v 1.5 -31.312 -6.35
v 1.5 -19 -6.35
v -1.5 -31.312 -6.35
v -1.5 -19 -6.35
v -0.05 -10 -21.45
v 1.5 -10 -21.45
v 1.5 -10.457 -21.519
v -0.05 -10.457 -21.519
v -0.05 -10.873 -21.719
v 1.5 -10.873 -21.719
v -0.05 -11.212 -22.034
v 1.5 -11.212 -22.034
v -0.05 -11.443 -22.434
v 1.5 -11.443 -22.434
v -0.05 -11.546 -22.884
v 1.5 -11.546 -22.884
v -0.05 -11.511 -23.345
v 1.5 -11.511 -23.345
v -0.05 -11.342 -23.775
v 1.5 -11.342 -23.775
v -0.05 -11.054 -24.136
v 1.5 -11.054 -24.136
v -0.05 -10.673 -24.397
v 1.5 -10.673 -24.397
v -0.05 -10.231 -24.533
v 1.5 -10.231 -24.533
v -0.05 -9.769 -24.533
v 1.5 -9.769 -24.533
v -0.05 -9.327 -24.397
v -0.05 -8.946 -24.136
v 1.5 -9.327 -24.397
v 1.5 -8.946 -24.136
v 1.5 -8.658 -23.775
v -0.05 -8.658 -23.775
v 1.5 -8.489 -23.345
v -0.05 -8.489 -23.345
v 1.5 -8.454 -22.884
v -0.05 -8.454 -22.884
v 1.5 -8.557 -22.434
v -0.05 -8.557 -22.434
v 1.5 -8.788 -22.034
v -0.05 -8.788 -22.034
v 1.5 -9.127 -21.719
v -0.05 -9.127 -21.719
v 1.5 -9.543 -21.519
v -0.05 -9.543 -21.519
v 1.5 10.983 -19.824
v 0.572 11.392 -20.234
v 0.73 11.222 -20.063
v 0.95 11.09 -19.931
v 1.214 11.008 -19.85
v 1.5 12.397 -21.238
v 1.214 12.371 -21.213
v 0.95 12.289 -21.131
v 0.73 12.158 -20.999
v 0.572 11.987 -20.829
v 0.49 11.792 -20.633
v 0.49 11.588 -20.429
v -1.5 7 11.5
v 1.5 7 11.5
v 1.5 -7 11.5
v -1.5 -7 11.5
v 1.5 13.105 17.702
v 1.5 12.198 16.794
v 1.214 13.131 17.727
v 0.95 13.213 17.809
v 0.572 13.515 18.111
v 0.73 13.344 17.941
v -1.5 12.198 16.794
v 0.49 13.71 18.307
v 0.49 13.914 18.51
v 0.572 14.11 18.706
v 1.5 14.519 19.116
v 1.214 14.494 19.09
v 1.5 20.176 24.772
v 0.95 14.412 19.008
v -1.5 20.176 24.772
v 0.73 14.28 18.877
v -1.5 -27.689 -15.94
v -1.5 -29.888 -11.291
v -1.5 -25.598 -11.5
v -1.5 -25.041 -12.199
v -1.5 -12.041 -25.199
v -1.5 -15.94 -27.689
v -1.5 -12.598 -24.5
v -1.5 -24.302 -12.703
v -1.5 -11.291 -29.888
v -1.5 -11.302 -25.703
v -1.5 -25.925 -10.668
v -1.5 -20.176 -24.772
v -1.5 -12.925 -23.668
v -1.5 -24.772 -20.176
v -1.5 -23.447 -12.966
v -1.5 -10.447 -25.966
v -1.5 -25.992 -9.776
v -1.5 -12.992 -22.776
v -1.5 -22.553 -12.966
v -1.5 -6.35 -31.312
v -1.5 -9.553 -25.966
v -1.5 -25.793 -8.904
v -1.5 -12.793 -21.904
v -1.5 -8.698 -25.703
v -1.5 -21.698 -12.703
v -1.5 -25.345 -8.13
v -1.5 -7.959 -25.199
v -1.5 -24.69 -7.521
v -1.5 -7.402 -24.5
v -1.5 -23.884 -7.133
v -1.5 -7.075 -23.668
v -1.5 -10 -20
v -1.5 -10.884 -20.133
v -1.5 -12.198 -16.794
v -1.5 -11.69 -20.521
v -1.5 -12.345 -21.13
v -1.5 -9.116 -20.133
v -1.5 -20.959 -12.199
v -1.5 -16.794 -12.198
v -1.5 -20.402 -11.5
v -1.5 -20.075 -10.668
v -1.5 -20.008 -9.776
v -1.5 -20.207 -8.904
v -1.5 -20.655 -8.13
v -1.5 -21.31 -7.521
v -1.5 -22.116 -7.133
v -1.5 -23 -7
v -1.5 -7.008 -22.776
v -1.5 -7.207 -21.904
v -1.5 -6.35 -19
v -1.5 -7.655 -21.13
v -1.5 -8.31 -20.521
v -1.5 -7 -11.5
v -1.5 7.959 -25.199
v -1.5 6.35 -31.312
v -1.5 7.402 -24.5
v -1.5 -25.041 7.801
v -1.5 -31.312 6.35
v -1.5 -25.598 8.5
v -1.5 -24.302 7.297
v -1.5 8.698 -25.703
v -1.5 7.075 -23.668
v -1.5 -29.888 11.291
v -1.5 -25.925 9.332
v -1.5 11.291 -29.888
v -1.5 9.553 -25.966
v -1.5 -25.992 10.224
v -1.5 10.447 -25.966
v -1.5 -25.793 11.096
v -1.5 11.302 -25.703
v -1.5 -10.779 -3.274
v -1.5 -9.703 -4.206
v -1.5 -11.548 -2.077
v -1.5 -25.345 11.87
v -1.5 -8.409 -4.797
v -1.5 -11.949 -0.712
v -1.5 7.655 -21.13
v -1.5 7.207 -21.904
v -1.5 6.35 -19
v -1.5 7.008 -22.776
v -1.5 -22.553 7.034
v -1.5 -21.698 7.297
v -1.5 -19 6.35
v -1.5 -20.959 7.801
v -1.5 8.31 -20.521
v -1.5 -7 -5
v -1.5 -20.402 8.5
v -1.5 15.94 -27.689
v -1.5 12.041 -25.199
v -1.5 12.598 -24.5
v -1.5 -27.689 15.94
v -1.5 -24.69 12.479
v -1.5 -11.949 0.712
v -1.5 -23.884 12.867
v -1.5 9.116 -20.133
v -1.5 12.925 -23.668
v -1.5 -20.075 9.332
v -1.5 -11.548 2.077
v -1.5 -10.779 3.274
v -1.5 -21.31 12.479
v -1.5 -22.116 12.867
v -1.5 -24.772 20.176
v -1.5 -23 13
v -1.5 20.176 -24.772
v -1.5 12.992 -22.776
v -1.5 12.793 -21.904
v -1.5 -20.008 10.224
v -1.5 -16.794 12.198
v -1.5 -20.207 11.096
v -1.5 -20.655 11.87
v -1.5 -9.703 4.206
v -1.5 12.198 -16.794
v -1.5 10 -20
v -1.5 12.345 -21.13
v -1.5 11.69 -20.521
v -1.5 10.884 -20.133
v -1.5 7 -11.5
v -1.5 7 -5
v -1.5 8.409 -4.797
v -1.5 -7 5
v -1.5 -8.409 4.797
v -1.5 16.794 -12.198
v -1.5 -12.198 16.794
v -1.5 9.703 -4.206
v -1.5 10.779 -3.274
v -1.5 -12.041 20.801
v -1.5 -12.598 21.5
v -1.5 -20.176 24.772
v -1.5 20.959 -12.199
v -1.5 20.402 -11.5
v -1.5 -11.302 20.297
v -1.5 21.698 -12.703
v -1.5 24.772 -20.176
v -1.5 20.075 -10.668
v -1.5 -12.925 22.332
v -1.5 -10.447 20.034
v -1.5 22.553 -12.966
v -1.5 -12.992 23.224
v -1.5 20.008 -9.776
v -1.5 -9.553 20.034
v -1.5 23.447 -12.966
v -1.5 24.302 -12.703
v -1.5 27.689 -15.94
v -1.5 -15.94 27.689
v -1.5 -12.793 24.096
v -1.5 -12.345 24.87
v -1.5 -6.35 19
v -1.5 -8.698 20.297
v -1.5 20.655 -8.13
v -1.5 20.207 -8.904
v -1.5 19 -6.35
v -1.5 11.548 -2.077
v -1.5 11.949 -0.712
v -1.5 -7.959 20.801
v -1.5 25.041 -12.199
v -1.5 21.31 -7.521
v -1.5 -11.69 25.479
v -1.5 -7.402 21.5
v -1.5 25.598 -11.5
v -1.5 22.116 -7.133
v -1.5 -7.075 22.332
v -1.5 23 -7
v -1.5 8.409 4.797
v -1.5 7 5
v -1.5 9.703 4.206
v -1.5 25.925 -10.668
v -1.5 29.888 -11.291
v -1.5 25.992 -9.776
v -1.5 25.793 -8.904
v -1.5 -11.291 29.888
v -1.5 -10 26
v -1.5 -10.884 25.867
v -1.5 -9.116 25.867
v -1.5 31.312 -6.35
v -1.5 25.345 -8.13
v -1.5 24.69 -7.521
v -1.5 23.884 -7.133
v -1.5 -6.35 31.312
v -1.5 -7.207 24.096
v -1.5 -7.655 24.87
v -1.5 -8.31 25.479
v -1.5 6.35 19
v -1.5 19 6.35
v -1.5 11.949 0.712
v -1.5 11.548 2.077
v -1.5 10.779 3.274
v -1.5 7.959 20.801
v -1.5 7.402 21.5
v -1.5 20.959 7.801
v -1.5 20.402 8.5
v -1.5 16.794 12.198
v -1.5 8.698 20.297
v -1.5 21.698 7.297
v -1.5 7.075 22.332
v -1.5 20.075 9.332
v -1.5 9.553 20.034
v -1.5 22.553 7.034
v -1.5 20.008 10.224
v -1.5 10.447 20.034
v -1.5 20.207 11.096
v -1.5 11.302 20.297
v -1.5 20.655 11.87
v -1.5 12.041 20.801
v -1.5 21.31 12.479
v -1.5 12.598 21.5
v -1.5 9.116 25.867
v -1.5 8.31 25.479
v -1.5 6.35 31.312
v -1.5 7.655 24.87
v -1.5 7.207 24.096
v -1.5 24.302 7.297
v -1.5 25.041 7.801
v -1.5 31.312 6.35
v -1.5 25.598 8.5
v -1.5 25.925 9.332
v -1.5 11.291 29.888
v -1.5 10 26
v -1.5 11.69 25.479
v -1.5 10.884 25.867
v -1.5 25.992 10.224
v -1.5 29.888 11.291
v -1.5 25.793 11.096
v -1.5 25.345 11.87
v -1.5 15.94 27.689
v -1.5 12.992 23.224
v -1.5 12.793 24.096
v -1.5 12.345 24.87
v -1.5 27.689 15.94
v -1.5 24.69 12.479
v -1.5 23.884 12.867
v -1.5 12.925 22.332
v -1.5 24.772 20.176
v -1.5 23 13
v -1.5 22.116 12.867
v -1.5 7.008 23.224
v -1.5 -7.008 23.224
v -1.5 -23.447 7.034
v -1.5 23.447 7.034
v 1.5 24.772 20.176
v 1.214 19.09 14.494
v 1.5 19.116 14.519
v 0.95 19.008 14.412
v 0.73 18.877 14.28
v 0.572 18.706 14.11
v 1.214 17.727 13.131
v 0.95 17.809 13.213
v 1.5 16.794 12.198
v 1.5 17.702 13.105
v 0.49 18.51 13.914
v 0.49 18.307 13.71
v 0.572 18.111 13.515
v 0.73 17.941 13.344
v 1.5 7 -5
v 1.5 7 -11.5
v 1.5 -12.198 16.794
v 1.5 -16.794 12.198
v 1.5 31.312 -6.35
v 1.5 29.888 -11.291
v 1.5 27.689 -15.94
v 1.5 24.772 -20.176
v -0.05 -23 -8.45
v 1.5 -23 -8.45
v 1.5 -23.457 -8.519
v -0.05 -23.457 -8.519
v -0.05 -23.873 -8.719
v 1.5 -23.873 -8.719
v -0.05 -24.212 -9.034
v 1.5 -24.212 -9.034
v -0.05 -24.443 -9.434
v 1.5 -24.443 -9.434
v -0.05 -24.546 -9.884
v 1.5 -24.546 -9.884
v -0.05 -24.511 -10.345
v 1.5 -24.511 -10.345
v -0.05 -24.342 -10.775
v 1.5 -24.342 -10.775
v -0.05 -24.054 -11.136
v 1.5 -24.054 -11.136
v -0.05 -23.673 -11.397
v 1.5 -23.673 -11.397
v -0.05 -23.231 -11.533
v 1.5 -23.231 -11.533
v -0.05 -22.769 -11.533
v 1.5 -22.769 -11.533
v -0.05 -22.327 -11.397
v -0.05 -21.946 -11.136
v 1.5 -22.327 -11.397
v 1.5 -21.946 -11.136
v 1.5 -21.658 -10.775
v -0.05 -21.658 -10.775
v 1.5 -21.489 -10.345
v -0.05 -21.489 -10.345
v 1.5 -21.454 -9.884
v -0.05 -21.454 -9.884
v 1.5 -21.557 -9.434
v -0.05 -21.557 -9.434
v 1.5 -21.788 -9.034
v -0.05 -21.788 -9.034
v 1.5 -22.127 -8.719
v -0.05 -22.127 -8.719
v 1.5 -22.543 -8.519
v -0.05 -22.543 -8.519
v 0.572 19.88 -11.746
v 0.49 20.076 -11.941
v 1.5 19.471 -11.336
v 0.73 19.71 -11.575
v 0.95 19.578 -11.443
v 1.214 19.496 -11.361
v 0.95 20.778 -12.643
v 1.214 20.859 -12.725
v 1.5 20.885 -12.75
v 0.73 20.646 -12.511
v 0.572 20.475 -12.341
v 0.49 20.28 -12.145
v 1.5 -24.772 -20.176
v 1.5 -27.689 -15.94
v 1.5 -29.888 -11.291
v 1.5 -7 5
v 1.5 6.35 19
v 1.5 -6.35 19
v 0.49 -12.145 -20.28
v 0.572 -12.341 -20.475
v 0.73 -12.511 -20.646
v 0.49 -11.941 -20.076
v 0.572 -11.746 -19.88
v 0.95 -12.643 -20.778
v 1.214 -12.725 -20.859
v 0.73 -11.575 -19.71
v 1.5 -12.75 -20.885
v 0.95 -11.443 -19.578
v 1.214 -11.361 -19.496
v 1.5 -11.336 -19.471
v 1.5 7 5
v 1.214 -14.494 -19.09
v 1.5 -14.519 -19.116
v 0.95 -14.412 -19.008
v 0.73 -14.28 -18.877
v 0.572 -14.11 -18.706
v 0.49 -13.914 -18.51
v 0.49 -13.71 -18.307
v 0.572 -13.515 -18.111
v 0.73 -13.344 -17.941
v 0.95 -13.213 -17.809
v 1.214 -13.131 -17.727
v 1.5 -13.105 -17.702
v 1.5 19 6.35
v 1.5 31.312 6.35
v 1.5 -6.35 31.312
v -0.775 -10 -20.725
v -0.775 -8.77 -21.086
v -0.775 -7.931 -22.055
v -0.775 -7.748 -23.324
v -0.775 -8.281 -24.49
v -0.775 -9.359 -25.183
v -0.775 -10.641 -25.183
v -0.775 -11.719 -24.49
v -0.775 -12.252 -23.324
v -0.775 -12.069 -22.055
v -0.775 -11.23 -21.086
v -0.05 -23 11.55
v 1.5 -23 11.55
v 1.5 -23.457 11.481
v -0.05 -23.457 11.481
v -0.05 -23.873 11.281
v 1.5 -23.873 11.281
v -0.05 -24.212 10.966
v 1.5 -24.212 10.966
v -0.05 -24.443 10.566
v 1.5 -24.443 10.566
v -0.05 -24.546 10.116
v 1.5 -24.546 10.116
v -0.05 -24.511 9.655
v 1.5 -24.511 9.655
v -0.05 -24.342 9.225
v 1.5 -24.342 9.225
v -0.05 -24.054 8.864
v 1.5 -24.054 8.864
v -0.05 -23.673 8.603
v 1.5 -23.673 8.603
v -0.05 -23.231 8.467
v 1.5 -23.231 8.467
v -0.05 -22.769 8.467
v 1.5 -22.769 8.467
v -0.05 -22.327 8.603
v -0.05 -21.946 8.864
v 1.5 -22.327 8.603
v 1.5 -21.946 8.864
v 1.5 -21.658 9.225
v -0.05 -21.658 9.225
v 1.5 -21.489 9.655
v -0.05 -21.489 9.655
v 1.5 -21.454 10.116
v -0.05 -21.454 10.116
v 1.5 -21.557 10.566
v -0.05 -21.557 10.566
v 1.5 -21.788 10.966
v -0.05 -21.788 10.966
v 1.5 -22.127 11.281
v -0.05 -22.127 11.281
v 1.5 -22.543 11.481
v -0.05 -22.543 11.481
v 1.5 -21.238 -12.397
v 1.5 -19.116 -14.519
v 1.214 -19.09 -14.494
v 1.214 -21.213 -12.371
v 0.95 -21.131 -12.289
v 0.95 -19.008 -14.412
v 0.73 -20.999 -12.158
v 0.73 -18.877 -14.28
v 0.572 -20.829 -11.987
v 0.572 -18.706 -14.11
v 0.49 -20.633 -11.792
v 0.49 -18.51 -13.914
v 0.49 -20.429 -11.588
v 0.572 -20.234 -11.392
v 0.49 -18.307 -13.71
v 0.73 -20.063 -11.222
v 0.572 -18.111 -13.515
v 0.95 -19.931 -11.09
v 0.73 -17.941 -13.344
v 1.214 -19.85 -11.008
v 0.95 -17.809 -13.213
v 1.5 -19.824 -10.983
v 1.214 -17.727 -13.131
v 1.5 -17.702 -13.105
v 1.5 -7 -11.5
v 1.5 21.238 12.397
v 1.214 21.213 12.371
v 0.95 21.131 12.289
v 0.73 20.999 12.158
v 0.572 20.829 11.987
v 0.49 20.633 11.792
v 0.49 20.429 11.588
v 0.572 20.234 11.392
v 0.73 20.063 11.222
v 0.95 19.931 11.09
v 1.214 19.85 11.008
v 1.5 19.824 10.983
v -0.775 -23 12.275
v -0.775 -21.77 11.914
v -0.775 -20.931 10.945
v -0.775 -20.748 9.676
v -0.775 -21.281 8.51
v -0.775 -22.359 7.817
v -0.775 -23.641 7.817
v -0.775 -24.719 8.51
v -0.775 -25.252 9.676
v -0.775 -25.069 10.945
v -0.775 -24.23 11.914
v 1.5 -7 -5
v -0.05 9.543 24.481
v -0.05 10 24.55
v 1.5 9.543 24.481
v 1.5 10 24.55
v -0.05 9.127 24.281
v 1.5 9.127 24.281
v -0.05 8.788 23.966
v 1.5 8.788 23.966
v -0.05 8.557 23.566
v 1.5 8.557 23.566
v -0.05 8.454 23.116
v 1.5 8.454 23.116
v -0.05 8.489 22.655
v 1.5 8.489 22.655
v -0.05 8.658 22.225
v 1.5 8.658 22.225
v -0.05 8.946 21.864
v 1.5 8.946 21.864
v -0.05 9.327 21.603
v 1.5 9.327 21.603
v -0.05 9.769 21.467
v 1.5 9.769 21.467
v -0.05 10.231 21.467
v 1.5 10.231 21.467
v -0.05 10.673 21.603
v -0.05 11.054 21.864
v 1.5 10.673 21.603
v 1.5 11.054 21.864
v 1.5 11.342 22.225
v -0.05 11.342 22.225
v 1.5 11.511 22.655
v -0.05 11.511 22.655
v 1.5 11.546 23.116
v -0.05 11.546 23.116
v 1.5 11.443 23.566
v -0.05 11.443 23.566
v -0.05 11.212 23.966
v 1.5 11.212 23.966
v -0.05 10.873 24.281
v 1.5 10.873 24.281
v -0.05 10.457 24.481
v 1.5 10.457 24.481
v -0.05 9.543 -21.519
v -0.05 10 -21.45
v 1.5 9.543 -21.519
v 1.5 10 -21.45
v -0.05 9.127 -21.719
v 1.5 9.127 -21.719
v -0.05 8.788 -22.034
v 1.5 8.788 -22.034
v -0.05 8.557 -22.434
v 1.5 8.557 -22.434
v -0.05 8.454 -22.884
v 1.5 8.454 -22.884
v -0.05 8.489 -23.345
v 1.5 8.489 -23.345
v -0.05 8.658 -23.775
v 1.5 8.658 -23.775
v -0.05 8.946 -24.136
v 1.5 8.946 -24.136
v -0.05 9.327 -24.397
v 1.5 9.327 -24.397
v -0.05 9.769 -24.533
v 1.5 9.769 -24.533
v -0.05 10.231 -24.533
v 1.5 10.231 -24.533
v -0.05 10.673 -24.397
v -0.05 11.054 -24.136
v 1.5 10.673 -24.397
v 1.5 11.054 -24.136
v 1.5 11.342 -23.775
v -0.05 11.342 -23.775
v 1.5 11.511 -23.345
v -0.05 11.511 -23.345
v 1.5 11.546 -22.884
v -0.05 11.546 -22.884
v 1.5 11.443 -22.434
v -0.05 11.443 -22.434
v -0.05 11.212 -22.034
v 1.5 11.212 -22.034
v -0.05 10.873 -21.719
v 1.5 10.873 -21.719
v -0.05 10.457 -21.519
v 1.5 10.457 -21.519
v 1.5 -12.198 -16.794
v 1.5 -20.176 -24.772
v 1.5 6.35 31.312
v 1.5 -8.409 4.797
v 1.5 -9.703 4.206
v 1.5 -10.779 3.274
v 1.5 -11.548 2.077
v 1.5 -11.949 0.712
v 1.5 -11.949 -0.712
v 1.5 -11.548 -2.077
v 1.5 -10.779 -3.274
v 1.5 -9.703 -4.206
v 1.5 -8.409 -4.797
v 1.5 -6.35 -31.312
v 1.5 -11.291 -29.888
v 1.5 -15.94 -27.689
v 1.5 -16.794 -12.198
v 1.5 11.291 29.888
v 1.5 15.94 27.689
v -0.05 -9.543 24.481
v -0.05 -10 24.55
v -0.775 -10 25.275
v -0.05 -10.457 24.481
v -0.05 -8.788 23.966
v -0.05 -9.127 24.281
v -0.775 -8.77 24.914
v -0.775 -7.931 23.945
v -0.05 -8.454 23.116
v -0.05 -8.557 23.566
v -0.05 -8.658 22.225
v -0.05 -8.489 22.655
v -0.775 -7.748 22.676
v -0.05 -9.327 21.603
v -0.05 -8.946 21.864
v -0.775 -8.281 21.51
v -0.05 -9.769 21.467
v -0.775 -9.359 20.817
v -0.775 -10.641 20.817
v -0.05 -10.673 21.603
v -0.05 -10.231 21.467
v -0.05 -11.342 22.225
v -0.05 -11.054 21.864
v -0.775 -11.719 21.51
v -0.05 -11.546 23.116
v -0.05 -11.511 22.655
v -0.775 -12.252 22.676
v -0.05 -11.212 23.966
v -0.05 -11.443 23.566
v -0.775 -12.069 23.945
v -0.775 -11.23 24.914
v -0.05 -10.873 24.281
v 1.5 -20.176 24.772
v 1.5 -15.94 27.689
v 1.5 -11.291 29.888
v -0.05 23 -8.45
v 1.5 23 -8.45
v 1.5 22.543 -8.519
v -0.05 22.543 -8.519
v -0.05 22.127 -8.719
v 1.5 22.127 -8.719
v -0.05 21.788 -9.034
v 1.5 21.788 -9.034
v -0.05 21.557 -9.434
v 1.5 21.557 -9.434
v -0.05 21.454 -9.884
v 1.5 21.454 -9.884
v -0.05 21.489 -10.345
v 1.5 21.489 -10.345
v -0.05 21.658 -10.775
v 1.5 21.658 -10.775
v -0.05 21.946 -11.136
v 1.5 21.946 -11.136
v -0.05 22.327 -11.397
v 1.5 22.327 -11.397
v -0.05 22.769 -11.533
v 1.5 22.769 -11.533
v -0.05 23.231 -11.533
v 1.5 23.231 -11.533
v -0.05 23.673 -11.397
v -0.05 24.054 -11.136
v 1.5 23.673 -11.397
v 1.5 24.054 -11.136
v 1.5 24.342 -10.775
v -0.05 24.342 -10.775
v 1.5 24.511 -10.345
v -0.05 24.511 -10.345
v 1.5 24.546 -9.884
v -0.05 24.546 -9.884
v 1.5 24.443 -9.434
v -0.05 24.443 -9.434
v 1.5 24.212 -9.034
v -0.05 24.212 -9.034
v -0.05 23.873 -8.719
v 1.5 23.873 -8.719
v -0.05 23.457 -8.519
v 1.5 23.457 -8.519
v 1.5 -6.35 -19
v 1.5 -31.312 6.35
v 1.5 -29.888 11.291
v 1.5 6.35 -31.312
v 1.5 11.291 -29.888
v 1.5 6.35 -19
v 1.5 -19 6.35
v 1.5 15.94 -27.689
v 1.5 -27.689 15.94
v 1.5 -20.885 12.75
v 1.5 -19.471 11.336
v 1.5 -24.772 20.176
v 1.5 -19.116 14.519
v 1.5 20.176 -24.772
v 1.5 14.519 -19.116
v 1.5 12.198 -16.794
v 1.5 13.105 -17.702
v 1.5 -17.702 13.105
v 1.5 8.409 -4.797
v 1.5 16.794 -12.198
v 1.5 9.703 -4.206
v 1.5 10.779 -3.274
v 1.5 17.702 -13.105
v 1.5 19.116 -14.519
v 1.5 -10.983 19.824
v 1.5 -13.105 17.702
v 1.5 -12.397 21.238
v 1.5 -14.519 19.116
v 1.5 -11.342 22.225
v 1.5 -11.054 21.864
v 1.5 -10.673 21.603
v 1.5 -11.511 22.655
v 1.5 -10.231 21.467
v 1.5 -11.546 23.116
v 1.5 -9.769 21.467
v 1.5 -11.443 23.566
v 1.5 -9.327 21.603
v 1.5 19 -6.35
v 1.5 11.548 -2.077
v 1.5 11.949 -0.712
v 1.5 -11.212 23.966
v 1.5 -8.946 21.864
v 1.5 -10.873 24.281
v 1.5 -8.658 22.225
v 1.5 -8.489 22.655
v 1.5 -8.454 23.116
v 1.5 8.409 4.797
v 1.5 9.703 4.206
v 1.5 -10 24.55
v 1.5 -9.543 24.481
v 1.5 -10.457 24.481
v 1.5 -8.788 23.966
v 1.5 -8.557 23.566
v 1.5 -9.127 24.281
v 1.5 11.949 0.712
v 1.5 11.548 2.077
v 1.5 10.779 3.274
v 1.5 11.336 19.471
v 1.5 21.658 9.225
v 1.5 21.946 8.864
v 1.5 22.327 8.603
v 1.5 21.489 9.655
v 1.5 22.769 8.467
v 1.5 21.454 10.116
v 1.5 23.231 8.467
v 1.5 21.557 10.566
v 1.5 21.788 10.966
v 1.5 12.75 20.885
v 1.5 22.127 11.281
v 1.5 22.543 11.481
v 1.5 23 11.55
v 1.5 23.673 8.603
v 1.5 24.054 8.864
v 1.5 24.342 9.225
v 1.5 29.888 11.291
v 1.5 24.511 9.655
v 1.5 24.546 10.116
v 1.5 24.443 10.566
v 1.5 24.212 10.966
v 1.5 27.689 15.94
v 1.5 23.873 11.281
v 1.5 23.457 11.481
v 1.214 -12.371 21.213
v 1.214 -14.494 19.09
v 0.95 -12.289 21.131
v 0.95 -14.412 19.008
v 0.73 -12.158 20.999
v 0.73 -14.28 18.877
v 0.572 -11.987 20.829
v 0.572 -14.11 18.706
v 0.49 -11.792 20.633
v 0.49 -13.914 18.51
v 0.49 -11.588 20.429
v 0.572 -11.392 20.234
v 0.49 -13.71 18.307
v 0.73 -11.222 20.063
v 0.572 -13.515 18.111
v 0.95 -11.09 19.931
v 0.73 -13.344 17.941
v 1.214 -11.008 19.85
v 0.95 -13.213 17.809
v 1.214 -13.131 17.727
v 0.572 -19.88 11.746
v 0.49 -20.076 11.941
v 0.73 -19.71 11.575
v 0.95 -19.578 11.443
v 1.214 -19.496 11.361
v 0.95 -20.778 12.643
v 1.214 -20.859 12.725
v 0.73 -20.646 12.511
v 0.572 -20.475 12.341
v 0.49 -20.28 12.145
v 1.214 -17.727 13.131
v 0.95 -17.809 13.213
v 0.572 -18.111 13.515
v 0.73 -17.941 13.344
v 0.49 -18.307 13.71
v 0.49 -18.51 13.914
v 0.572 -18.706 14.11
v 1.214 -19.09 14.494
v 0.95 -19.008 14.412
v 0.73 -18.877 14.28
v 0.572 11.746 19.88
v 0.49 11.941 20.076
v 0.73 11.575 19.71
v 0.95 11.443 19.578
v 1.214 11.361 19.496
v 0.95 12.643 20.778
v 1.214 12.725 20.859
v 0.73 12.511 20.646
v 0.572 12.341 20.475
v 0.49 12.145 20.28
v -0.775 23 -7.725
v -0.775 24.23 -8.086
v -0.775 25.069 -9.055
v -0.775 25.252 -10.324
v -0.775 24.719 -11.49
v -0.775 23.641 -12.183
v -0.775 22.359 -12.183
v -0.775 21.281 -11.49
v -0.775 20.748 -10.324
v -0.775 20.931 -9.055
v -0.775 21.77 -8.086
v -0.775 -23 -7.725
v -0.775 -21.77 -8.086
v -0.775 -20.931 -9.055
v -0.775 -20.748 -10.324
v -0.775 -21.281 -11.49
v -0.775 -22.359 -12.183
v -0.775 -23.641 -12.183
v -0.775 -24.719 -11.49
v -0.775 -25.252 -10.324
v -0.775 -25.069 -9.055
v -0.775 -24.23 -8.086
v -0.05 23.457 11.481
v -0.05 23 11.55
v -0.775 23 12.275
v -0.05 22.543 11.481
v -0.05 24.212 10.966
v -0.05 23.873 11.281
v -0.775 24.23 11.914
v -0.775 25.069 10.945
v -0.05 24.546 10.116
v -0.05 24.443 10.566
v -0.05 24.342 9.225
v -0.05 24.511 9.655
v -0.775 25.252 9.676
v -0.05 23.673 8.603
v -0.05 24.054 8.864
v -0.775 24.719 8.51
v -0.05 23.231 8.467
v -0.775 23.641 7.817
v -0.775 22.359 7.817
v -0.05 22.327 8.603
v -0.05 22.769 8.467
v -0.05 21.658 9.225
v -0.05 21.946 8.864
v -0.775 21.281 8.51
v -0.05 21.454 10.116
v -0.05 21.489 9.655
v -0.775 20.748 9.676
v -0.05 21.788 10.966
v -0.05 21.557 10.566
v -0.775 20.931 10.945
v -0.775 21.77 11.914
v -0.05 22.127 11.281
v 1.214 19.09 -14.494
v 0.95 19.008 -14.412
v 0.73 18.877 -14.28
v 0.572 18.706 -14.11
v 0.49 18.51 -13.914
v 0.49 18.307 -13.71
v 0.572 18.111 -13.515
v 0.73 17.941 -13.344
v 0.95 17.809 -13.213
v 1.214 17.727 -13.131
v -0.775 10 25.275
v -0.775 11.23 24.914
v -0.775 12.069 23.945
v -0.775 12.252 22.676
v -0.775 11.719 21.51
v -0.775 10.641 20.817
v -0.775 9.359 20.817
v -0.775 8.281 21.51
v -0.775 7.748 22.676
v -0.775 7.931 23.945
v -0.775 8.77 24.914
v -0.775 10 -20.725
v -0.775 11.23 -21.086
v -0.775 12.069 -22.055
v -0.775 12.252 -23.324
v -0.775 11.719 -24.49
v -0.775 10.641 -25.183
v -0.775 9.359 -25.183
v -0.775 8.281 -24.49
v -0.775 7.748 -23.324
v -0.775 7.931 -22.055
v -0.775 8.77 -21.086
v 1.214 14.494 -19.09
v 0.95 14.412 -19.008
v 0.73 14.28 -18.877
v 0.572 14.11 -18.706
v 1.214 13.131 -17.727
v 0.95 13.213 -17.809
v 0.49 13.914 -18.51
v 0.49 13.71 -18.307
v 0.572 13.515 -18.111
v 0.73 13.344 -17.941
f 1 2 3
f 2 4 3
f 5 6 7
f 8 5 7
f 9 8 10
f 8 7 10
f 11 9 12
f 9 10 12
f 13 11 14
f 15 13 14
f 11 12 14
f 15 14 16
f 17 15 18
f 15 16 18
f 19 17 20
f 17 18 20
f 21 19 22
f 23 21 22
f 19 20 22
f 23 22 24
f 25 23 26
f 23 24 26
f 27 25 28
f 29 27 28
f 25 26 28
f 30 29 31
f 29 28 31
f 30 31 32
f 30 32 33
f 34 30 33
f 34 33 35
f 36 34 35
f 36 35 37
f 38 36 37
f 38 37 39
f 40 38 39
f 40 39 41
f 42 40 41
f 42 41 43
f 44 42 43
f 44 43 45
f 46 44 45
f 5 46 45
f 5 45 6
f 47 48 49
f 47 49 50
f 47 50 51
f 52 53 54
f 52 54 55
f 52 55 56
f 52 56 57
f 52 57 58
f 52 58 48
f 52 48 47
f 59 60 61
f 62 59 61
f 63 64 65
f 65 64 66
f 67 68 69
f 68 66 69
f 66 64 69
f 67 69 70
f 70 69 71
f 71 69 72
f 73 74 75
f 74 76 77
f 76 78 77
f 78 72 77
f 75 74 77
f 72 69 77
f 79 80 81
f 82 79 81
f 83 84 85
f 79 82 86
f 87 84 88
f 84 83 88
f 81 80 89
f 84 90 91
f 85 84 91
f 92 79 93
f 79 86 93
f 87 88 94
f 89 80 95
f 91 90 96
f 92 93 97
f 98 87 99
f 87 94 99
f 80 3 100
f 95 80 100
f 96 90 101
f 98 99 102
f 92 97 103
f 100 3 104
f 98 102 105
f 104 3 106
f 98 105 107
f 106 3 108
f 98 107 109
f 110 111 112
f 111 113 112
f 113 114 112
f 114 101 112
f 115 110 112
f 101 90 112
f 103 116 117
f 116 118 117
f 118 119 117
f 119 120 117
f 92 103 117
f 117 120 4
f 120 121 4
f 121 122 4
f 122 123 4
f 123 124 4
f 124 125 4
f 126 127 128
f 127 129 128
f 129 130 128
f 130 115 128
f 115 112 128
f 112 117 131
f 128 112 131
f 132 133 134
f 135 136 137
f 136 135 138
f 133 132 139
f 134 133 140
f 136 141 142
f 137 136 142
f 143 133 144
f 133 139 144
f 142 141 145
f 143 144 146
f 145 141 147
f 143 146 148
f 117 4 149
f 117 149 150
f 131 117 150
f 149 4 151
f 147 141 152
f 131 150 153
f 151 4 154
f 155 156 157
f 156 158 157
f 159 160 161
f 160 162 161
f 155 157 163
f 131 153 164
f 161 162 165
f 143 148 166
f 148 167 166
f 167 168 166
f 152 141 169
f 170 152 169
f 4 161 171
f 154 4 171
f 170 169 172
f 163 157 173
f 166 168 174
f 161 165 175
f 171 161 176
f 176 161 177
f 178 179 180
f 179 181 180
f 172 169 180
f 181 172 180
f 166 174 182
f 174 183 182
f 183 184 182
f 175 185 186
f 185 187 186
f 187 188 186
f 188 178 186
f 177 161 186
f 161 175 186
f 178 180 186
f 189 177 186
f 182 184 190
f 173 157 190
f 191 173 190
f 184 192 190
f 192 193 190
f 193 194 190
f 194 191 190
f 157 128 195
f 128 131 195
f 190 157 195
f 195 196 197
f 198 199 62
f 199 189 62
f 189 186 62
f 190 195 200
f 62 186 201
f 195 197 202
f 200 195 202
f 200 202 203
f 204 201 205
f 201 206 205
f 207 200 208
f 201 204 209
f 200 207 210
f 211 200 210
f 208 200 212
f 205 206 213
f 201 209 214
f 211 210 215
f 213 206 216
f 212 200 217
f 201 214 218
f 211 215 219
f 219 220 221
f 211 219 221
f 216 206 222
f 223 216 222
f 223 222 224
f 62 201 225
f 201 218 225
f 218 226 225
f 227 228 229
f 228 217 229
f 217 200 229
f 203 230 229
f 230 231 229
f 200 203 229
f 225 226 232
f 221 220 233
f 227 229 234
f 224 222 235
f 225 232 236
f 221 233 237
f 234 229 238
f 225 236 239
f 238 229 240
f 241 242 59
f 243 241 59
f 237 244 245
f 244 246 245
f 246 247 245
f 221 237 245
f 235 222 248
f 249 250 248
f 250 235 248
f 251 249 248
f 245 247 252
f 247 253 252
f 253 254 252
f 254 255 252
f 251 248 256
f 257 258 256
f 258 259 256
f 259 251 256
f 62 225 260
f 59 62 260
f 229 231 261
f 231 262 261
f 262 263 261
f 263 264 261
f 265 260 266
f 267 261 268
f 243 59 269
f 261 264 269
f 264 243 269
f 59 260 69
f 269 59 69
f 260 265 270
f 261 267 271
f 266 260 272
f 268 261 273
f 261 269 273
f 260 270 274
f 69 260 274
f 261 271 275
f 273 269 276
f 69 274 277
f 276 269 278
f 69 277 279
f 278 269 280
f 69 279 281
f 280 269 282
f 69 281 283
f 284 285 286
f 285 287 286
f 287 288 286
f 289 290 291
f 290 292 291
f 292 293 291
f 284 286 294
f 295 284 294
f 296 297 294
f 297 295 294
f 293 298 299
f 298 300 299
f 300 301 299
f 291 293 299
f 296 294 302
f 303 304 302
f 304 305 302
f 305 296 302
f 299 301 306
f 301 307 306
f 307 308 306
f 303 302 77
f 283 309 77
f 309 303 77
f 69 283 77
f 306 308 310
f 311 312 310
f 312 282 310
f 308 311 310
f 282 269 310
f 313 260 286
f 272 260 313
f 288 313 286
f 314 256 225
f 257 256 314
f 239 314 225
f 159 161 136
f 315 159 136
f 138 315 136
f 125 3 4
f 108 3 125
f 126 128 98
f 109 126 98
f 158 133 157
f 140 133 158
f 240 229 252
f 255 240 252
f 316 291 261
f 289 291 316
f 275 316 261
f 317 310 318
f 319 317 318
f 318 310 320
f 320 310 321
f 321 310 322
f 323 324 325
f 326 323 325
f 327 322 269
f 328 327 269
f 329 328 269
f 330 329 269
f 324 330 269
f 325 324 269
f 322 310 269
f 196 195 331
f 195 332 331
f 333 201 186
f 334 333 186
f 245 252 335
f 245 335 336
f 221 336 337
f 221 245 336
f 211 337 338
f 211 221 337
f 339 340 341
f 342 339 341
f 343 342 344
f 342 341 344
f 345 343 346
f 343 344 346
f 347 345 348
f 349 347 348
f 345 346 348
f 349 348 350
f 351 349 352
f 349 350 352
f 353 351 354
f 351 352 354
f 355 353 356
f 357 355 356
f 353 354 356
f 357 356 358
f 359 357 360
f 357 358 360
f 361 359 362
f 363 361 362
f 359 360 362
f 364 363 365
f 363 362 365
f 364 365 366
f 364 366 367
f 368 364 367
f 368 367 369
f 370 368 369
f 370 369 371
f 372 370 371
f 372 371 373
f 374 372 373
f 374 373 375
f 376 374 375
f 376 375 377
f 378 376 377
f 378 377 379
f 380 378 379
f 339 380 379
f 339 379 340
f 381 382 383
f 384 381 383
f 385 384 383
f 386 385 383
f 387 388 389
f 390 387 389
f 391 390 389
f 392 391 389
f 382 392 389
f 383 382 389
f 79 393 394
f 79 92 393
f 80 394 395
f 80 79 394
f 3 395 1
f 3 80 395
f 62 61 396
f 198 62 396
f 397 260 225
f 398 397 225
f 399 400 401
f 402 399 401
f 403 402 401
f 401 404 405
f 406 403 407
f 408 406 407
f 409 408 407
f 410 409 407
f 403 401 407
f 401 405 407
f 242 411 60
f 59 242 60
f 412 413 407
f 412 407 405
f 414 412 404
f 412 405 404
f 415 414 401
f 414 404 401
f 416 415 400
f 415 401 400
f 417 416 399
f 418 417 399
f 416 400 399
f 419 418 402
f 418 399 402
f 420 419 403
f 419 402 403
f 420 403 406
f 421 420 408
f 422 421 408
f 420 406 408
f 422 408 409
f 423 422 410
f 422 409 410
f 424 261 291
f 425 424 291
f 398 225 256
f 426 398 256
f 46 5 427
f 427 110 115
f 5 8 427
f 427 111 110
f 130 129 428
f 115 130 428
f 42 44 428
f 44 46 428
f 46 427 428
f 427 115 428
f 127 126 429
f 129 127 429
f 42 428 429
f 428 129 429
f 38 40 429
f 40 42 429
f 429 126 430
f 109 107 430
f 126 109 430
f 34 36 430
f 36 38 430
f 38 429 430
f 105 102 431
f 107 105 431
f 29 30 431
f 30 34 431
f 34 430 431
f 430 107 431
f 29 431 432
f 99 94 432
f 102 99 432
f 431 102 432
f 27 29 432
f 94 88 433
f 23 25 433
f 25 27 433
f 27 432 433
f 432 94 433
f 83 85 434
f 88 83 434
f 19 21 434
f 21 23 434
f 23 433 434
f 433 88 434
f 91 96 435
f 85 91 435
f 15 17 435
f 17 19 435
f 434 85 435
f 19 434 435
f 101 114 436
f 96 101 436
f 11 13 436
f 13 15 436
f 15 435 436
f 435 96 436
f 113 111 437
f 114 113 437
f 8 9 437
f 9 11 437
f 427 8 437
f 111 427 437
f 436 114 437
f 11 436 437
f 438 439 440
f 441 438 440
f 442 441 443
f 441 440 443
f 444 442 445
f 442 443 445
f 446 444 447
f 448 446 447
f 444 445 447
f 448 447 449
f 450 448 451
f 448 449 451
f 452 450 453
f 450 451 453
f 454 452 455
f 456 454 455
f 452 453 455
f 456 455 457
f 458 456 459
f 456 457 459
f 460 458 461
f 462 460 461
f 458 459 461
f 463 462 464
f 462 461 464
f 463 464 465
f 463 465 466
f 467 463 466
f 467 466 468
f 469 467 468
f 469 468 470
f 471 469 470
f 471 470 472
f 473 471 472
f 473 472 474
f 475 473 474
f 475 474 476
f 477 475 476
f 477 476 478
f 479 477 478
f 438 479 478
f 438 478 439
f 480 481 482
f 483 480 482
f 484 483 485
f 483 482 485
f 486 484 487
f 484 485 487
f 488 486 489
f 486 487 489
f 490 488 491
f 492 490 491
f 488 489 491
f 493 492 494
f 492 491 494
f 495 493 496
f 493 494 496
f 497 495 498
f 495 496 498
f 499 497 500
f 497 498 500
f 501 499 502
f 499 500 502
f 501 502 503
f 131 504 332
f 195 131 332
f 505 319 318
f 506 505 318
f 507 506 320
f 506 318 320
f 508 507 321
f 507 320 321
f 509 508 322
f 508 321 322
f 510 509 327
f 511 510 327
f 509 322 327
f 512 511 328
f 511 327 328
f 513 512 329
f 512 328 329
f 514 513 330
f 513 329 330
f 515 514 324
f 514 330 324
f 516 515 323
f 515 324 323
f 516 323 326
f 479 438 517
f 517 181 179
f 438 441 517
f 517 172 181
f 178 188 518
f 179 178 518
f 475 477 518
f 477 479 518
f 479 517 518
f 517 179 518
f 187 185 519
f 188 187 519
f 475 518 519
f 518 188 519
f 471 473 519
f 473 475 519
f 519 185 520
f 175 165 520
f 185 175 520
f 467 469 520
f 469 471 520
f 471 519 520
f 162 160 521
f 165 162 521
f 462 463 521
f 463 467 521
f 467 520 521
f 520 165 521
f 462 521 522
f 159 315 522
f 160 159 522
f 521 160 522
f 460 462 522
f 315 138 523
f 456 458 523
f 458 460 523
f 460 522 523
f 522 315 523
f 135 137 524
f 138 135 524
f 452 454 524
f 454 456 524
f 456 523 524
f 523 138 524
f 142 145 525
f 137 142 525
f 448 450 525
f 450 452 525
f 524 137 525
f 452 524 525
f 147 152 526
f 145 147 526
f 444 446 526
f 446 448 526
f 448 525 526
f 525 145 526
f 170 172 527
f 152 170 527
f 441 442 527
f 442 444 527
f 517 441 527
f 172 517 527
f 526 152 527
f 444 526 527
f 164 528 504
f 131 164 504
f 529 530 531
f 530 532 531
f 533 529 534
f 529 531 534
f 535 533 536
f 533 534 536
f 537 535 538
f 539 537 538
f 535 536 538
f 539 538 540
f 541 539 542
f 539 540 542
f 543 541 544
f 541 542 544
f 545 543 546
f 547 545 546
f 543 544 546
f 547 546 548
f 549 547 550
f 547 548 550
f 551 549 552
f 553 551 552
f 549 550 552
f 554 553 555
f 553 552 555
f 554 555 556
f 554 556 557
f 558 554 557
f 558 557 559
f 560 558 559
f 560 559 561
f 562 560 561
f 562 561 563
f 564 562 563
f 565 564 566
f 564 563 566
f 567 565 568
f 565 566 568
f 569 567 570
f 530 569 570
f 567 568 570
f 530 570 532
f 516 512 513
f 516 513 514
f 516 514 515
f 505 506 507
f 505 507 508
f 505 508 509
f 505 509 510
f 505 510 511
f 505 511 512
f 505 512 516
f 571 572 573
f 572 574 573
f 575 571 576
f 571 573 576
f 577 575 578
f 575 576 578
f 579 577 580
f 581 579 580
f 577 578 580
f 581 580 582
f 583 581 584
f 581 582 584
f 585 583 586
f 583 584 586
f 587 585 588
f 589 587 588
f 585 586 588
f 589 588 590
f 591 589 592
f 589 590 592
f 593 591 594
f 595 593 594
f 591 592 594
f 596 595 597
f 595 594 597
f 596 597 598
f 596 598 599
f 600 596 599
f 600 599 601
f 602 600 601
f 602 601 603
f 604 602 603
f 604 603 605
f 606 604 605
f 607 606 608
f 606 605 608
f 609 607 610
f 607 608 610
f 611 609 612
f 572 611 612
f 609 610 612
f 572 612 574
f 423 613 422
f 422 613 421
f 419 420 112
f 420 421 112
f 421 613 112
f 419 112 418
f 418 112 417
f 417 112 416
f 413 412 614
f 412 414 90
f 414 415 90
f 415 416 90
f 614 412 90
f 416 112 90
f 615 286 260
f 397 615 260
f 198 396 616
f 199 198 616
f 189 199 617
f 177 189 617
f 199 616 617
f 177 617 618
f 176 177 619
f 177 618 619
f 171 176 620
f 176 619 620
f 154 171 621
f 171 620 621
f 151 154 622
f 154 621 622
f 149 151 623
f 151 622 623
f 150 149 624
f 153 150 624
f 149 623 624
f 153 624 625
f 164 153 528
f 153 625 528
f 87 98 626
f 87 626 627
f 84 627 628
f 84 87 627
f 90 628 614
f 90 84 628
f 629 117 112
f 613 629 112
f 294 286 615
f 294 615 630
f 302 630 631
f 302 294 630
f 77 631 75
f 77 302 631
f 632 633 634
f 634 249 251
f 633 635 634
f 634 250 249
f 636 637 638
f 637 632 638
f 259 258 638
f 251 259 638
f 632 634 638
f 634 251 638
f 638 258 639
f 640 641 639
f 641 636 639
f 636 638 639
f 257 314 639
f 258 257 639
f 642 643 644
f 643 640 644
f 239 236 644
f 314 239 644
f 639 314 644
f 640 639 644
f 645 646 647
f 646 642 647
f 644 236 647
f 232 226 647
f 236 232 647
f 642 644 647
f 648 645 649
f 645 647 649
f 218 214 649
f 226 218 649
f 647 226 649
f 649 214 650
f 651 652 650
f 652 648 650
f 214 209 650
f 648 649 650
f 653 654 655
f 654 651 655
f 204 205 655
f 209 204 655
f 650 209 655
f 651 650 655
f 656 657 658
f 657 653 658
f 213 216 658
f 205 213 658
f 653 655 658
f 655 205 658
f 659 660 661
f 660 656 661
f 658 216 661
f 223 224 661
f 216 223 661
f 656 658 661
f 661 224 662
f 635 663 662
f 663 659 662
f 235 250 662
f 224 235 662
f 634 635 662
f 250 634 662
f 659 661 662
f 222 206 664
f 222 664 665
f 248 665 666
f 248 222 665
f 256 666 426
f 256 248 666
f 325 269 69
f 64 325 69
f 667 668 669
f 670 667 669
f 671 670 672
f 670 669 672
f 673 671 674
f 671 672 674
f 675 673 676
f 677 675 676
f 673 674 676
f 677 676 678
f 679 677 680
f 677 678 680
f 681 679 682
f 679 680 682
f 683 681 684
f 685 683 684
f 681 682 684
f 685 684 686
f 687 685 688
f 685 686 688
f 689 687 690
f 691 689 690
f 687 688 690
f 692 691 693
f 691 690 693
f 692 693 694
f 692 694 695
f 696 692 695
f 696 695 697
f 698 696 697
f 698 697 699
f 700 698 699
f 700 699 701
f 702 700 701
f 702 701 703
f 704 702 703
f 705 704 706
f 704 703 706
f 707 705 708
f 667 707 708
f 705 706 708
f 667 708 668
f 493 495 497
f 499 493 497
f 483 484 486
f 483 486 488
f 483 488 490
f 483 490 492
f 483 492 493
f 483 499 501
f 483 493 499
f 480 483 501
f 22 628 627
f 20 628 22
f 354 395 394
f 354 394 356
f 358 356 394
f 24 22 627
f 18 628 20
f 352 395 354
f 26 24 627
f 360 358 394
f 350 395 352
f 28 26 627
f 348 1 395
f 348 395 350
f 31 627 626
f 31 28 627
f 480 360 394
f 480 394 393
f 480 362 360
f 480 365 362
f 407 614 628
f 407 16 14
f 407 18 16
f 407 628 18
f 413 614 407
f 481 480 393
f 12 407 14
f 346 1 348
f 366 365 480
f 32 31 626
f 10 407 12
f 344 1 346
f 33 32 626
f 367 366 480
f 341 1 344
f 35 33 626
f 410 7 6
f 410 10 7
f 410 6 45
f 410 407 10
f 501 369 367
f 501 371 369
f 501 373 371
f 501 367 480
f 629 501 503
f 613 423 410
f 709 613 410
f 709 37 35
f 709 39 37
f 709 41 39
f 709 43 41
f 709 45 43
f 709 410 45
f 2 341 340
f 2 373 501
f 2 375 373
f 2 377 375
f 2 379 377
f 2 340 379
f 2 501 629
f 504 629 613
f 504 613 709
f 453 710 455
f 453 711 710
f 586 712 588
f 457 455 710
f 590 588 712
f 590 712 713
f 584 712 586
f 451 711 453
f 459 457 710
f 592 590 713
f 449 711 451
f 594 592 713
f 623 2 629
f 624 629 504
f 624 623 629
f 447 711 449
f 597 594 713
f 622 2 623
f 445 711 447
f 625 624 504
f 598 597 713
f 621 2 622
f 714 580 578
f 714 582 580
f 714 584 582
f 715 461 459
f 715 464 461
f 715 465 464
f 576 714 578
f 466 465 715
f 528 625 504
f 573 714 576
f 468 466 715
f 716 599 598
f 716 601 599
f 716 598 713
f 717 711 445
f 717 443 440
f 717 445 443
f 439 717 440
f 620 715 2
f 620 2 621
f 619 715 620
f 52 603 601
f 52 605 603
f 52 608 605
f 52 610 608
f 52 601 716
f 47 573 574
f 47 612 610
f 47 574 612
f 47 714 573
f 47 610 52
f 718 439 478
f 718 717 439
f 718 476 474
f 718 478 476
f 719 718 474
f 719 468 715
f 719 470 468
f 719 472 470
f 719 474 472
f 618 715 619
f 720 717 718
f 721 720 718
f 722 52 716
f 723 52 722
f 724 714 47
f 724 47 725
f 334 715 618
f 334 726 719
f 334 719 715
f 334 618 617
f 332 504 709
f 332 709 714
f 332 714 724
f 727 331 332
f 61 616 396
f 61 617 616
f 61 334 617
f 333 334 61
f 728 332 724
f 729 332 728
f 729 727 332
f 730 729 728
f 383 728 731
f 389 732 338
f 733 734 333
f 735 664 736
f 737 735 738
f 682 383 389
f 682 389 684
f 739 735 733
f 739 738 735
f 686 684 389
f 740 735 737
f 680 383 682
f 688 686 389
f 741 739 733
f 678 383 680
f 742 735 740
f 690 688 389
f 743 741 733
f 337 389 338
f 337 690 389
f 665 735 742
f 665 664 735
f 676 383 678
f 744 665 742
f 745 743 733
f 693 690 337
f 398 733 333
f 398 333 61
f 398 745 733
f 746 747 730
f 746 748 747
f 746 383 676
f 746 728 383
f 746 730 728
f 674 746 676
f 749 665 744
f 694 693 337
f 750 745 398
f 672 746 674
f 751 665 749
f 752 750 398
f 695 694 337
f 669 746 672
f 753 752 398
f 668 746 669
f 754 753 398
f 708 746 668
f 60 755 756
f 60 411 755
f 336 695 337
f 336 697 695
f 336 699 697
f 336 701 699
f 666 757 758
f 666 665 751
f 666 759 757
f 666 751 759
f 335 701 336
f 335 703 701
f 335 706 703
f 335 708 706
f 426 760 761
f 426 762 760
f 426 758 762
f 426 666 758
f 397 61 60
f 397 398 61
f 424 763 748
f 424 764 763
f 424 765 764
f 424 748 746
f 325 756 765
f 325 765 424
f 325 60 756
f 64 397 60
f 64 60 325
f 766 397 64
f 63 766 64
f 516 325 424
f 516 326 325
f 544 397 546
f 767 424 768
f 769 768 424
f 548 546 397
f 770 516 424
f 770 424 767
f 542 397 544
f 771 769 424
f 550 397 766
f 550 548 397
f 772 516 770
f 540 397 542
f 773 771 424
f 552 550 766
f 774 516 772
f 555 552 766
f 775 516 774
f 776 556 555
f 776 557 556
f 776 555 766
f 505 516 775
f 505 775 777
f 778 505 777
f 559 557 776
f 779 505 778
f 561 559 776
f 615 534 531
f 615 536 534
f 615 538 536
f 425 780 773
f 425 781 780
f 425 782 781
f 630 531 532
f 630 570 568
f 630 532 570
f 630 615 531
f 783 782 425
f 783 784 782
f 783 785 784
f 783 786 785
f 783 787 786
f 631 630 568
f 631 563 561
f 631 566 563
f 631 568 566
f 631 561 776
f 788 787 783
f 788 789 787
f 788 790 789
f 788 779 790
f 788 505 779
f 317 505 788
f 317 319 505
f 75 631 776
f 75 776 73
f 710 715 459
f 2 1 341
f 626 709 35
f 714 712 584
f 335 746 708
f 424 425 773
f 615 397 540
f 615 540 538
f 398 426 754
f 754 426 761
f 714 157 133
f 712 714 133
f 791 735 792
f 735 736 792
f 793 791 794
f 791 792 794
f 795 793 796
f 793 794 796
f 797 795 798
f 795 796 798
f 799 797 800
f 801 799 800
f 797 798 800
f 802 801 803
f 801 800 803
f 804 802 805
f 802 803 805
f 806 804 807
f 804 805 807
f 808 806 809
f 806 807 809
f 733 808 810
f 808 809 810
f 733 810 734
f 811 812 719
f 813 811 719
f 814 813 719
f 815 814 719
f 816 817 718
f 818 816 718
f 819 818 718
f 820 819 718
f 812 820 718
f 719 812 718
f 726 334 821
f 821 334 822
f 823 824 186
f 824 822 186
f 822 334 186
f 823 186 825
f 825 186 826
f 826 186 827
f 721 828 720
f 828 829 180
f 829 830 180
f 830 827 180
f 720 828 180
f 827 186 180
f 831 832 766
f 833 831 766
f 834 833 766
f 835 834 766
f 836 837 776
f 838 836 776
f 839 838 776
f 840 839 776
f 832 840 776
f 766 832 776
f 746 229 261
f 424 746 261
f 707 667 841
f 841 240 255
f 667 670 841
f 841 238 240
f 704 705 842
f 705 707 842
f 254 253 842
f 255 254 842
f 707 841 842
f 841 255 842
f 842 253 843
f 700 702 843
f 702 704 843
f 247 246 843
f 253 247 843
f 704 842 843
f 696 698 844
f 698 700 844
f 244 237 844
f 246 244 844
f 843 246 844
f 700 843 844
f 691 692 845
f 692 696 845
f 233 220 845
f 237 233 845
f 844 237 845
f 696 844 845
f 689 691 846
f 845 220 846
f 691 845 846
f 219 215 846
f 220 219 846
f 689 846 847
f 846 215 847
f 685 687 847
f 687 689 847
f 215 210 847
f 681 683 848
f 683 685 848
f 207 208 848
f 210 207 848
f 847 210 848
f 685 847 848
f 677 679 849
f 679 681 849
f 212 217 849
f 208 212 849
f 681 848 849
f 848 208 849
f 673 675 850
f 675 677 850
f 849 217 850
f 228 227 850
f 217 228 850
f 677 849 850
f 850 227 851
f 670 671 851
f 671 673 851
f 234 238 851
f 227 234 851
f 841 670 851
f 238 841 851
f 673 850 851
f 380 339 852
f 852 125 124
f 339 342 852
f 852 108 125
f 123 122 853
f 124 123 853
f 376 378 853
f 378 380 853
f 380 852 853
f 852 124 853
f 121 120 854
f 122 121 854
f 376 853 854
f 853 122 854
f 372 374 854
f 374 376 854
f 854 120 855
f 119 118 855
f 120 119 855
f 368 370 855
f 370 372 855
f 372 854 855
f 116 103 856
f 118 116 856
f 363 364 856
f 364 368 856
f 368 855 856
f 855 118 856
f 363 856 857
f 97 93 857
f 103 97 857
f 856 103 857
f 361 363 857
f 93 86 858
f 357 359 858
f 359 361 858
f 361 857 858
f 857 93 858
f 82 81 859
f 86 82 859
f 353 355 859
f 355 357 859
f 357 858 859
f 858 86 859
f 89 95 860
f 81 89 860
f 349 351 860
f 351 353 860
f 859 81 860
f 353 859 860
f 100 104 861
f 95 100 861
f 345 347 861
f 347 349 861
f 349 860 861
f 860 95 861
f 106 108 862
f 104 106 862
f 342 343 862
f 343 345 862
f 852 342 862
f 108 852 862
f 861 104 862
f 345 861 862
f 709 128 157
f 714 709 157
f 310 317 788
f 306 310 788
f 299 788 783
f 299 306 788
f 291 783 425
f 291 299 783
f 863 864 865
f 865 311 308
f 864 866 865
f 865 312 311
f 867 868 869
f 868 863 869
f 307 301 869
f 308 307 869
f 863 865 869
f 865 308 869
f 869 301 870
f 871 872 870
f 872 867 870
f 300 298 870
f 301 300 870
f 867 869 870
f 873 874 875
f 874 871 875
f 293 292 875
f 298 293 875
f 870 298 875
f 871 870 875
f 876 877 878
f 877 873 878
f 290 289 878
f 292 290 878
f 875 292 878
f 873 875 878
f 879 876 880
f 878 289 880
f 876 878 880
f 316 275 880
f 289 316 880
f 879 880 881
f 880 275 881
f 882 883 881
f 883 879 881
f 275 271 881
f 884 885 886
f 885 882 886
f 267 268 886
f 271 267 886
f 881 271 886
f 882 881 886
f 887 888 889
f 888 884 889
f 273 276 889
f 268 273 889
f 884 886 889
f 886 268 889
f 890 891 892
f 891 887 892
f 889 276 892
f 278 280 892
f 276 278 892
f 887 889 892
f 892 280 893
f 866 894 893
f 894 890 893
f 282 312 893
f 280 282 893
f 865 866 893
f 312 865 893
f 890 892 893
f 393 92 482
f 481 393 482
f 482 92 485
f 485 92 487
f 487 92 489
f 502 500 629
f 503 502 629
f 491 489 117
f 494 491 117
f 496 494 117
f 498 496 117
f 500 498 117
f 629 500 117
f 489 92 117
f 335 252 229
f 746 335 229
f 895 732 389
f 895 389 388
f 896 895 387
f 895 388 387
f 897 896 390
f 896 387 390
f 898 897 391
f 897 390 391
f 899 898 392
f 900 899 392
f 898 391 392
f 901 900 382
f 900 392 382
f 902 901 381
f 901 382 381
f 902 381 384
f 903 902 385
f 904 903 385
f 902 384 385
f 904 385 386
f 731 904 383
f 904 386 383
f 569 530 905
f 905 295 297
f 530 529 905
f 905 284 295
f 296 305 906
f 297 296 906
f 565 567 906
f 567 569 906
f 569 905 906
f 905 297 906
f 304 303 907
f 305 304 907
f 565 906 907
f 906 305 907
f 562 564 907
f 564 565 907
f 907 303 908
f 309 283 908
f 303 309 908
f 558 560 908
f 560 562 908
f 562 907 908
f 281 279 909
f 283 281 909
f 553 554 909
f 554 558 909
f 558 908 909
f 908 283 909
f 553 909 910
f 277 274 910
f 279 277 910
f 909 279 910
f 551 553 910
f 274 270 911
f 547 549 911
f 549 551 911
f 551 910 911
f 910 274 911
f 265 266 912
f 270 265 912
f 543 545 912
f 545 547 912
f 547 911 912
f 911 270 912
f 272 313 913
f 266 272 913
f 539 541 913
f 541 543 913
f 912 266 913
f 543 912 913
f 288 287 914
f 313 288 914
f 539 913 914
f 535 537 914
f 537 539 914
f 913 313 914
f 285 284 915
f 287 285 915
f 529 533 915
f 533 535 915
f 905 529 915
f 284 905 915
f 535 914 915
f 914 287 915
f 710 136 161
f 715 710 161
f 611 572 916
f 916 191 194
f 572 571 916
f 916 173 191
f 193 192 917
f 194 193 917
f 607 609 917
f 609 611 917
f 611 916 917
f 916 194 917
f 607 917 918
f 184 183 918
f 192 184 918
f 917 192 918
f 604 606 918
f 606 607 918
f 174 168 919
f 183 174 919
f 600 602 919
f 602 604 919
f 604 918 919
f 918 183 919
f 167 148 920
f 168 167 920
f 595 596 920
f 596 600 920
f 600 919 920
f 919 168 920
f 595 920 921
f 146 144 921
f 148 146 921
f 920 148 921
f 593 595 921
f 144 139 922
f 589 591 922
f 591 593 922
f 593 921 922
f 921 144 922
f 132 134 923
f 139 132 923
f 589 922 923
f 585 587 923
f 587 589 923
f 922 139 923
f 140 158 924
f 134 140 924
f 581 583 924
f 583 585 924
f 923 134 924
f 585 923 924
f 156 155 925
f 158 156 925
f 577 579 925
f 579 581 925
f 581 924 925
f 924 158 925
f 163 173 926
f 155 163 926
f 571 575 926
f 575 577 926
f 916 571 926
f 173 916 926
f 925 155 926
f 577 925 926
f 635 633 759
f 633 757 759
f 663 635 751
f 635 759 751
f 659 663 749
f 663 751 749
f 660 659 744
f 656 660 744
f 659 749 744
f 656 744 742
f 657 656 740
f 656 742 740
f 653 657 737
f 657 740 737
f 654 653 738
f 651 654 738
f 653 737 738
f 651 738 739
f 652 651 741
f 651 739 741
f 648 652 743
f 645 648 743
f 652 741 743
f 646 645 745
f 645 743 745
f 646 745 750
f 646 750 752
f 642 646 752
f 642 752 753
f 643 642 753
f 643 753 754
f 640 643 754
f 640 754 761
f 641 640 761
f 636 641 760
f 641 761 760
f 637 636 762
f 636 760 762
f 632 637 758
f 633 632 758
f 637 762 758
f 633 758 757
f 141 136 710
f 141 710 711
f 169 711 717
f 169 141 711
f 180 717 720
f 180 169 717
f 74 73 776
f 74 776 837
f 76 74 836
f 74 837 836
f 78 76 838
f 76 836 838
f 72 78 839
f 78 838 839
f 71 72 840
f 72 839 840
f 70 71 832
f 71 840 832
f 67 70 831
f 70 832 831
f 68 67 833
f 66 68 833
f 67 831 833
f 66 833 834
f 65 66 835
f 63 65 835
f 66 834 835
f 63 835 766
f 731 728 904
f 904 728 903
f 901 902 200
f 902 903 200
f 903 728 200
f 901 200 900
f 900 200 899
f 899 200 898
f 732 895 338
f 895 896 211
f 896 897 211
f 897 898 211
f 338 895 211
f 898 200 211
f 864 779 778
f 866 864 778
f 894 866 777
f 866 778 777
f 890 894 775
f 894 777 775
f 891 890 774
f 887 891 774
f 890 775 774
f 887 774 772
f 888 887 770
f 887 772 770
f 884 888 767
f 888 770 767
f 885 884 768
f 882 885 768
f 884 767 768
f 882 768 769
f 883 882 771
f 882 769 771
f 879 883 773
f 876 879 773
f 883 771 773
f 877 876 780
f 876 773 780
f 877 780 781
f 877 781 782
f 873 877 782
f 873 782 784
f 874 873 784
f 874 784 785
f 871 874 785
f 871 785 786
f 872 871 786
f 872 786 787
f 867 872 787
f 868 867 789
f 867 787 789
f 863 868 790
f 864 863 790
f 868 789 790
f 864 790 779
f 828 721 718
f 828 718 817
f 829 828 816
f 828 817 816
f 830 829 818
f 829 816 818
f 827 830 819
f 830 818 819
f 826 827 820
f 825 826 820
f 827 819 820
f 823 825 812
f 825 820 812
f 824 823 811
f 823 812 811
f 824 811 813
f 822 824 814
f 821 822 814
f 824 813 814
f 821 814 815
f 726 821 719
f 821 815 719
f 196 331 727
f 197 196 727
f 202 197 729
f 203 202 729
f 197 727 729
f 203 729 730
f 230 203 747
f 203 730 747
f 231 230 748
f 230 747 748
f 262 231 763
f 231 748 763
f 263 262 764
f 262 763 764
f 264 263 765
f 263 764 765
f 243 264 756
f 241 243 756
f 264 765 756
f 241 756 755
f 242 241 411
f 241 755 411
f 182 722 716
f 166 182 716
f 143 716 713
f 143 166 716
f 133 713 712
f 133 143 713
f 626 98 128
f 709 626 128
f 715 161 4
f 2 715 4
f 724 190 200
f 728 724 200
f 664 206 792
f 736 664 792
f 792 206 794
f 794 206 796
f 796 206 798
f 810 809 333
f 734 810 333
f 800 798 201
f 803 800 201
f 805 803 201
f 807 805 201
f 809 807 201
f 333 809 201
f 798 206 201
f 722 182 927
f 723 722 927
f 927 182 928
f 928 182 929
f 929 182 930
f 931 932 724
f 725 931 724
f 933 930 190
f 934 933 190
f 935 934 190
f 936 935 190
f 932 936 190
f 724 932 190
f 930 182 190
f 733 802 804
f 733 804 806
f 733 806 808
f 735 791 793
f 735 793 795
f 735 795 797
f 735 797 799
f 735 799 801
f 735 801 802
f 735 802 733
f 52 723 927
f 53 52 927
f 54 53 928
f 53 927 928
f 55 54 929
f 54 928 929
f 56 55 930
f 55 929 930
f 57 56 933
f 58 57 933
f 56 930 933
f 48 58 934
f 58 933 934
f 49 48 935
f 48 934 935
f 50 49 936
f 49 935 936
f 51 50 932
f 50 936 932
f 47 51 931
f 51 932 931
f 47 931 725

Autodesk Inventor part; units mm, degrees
ref_plane "YZ Plane" through (0, 0, 0) normal (1, 0, 0) x (0, 1, 0)
sketch "Náčrt1" plane through (0, 0, 0) normal (1, 0, 0) x (0, 1, 0)
  line L0 (19, 6.35) -> (31.312, 6.35)
  line L1 (31.312, -6.35) -> (19, -6.35)
  line L2 (19, -6.35) -> (19, 6.35)
  line L3 (24.7725, 20.1763) -> (16.7938, 12.1976)
  line L4 (16.7938, 12.1976) -> (12.1976, 16.7938)
  line L5 (12.1976, 16.7938) -> (20.1763, 24.7725)
  line L6 (0, 0) -> (14.4957, 14.4957)
  line L7 (6.35, 19) -> (-6.35, 19)
  line L8 (6.35, 31.312) -> (6.35, 19)
  line L9 (-6.35, 19) -> (-6.35, 31.312)
  line L10 (-20.1763, 24.7725) -> (-12.1976, 16.7938)
  line L11 (-12.1976, 16.7938) -> (-16.7938, 12.1976)
  line L12 (-16.7938, 12.1976) -> (-24.7725, 20.1763)
  line L13 (-19, 6.35) -> (-19, -6.35)
  line L14 (-31.312, 6.35) -> (-19, 6.35)
  line L15 (-19, -6.35) -> (-31.312, -6.35)
  line L16 (-24.7725, -20.1763) -> (-16.7938, -12.1976)
  line L17 (-16.7938, -12.1976) -> (-12.1976, -16.7938)
  line L18 (-12.1976, -16.7938) -> (-20.1763, -24.7725)
  line L19 (-6.35, -19) -> (6.35, -19)
  line L20 (-6.35, -31.312) -> (-6.35, -19)
  line L21 (6.35, -19) -> (6.35, -31.312)
  line L22 (20.1763, -24.7725) -> (12.1976, -16.7938)
  line L23 (12.1976, -16.7938) -> (16.7938, -12.1976)
  line L24 (16.7938, -12.1976) -> (24.7725, -20.1763)
  arc A0 (24.7725, -20.1763) -> (31.312, -6.35) centre (0, 0) ccw
  arc A1 (6.35, -31.312) -> (20.1763, -24.7725) centre (0, 0) ccw
  arc A2 (-20.1763, -24.7725) -> (-6.35, -31.312) centre (0, 0) ccw
  arc A3 (-31.312, -6.35) -> (-24.7725, -20.1763) centre (0, 0) ccw
  arc A4 (-24.7725, 20.1763) -> (-31.312, 6.35) centre (0, 0) ccw
  arc A5 (-6.35, 31.312) -> (-20.1763, 24.7725) centre (0, 0) ccw
  arc A6 (31.312, 6.35) -> (24.7725, 20.1763) centre (0, 0) ccw
  arc A7 (20.1763, 24.7725) -> (6.35, 31.312) centre (0, 0) ccw
  line L25 (16.187, 20.7832) -> (20.7832, 16.187)
  line L26 (14.9495, 23.4348) -> (13.5353, 22.0206)
  line L27 (13.5353, 22.0206) -> (22.0206, 13.5353)
  line L28 (22.0206, 13.5353) -> (23.4348, 14.9495)
  line L29 (23.4348, 14.9495) -> (14.9495, 23.4348)
  line L30 (-13.5353, 22.0206) -> (-14.9495, 23.4348)
  line L31 (-22.0206, 13.5353) -> (-13.5353, 22.0206)
  line L32 (-14.9495, 23.4348) -> (-23.4348, 14.9495)
  line L33 (-23.4348, 14.9495) -> (-22.0206, 13.5353)
  line L34 (-22.0206, -13.5353) -> (-23.4348, -14.9495)
  line L35 (-13.5353, -22.0206) -> (-22.0206, -13.5353)
  line L36 (-23.4348, -14.9495) -> (-14.9495, -23.4348)
  line L37 (-14.9495, -23.4348) -> (-13.5353, -22.0206)
  line L38 (13.5353, -22.0206) -> (14.9495, -23.4348)
  line L39 (22.0206, -13.5353) -> (13.5353, -22.0206)
  line L40 (14.9495, -23.4348) -> (23.4348, -14.9495)
  line L41 (23.4348, -14.9495) -> (22.0206, -13.5353)
  point P0 (-14.4957, 14.4957)
  point P1 (-14.4957, -14.4957)
  point P2 (14.4957, -14.4957)
  dimension "d1" = 6.35
  dimension "d2" = 6.35
  dimension "d4" = 6.5
  dimension "d5" = 3.25
  dimension "d6" = 20.5
  dimension "d7" = 45
  dimension "d10" = 360
  dimension "d12" = 2
  dimension "d13" = 12
  dimension "d14" = 1
  dimension "d15" = 2.75
  dimension "d18" = 360
extrude "Vysunutí1" add sketch "Náčrt1" along normal mid plane 3 contours L2 L1 A0 L24 L40 L41 L39 L23 L22 L38 A1 L21 L19 L20 A2 L18 L36 L37 L35 L17 L16 L34 A3 L15 L13 L14 A4 L12 L32 L33 L31 L11 L10 L30 A5 L9 L7 L8 A7 L5 L29 L26 L27 L4 L3 L28 A6 L0 | L29 L28 L27 L3 | L5 L27 L26 L29 | L24 L39 L41 L40 | L40 L38 L39 L22 | L32 L30 L31 L10 | L12 L31 L33 L32 | L18 L35 L37 L36 | L36 L34 L35 L16
ref_plane "Pracovní rovina1" through (1.5, 0, 0) normal (1, 0, 0) x (0, 0, -1)
sketch "Náčrt3" plane through (1.5, 0, 0) normal (1, 0, 0) x (0, 0, -1)
  line L0 (-11.5, 7) -> (-11.5, -7)
  line L1 (11.5, -7) -> (11.5, 7)
  arc A0 (5, 7) -> (-5, 7) centre (0, 7) ccw
  arc A1 (-5, -7) -> (5, -7) centre (0, -7) ccw
  line L2 (-11.5, -7) -> (-5, -7)
  line L3 (5, -7) -> (11.5, -7)
  line L4 (11.5, 7) -> (5, 7)
  line L5 (-5, 7) -> (-11.5, 7)
  point P0 (0, 0)
  dimension "d34" = 23
  dimension "d35" = 14
  dimension "d37" = 11.5
  dimension "d38" = 10
  dimension "d39" = 10
extrude "Vysunutí3" cut sketch "Náčrt3" against normal blind 4
ref_plane "Pracovní rovina2" through (-1.5, 0, 0) normal (-1, 0, 0) x (0, 0, 1)
sketch "Náčrt6" plane through (-1.5, 0, 0) normal (1, 0, 0) x (0, 0, -1)
  circle A0 centre (10, 23) radius 1.55
  circle A1 centre (-10, 23) radius 1.55
  circle A2 centre (-23, 10) radius 1.55
  circle A3 centre (-23, -10) radius 1.55
  circle A4 centre (-10, -23) radius 1.55
  circle A5 centre (10, -23) radius 1.55
  circle A6 centre (23, -10) radius 1.55
  circle A7 centre (23, 10) radius 1.55
  point P0 (0, 0)
  dimension "d52" = 3.1
  dimension "d53" = 3.1
  dimension "d54" = 23
  dimension "d55" = 23
  dimension "d56" = 10
  dimension "d57" = 10
  dimension "d60" = 360
sketch "Sketch7" plane through (-1.5, 16.7938, 12.1976) normal (0, -0.7071, 0.7071) x (1, 0, 0)
  circle A0 centre (2.9795, 2.2836) radius 1
  line L0 (0, 11.2836) -> (3, 11.2836) projected
  point P0 (1.5, -20.5)
  dimension "d64" = 2
  dimension "d65" = 9
extrude "Extrusion6" cut sketch "Sketch7" against normal blind 3 and the other way blind 9
pattern_circular "Circular Pattern1" count 4 over 360 about axis through (0, 0, 0) along (1, 0, 0) of "Extrusion6"
hole "Hole3" at (-1.5, 10, 23) at (-1.5, 23, 10) at (-1.5, -10, 23) at (-1.5, -23, 10) at (-1.5, -23, -10) at (-1.5, 23, -10) at (-1.5, 10, -23) at (-1.5, -10, -23) direction (1, 0, 0) diameter 3.1 end through all countersink diameter 6 countersink angle 90
equation "\"d2\" = d1"
equation "\"d5\" = 0.5 * d4"
equation "\"d14\" = 0.5 * d12"
equation "\"d15\" = -0.5 * d4 + 0.5 * d13"
equation "\"d37\" = 0.5 * d34"
equation "\"d39\" = d38"
equation "\"d55\" = d54"
equation "\"d57\" = d56"
equation "\"d36\" = 0.5 * d35"
properties part number "deska"
